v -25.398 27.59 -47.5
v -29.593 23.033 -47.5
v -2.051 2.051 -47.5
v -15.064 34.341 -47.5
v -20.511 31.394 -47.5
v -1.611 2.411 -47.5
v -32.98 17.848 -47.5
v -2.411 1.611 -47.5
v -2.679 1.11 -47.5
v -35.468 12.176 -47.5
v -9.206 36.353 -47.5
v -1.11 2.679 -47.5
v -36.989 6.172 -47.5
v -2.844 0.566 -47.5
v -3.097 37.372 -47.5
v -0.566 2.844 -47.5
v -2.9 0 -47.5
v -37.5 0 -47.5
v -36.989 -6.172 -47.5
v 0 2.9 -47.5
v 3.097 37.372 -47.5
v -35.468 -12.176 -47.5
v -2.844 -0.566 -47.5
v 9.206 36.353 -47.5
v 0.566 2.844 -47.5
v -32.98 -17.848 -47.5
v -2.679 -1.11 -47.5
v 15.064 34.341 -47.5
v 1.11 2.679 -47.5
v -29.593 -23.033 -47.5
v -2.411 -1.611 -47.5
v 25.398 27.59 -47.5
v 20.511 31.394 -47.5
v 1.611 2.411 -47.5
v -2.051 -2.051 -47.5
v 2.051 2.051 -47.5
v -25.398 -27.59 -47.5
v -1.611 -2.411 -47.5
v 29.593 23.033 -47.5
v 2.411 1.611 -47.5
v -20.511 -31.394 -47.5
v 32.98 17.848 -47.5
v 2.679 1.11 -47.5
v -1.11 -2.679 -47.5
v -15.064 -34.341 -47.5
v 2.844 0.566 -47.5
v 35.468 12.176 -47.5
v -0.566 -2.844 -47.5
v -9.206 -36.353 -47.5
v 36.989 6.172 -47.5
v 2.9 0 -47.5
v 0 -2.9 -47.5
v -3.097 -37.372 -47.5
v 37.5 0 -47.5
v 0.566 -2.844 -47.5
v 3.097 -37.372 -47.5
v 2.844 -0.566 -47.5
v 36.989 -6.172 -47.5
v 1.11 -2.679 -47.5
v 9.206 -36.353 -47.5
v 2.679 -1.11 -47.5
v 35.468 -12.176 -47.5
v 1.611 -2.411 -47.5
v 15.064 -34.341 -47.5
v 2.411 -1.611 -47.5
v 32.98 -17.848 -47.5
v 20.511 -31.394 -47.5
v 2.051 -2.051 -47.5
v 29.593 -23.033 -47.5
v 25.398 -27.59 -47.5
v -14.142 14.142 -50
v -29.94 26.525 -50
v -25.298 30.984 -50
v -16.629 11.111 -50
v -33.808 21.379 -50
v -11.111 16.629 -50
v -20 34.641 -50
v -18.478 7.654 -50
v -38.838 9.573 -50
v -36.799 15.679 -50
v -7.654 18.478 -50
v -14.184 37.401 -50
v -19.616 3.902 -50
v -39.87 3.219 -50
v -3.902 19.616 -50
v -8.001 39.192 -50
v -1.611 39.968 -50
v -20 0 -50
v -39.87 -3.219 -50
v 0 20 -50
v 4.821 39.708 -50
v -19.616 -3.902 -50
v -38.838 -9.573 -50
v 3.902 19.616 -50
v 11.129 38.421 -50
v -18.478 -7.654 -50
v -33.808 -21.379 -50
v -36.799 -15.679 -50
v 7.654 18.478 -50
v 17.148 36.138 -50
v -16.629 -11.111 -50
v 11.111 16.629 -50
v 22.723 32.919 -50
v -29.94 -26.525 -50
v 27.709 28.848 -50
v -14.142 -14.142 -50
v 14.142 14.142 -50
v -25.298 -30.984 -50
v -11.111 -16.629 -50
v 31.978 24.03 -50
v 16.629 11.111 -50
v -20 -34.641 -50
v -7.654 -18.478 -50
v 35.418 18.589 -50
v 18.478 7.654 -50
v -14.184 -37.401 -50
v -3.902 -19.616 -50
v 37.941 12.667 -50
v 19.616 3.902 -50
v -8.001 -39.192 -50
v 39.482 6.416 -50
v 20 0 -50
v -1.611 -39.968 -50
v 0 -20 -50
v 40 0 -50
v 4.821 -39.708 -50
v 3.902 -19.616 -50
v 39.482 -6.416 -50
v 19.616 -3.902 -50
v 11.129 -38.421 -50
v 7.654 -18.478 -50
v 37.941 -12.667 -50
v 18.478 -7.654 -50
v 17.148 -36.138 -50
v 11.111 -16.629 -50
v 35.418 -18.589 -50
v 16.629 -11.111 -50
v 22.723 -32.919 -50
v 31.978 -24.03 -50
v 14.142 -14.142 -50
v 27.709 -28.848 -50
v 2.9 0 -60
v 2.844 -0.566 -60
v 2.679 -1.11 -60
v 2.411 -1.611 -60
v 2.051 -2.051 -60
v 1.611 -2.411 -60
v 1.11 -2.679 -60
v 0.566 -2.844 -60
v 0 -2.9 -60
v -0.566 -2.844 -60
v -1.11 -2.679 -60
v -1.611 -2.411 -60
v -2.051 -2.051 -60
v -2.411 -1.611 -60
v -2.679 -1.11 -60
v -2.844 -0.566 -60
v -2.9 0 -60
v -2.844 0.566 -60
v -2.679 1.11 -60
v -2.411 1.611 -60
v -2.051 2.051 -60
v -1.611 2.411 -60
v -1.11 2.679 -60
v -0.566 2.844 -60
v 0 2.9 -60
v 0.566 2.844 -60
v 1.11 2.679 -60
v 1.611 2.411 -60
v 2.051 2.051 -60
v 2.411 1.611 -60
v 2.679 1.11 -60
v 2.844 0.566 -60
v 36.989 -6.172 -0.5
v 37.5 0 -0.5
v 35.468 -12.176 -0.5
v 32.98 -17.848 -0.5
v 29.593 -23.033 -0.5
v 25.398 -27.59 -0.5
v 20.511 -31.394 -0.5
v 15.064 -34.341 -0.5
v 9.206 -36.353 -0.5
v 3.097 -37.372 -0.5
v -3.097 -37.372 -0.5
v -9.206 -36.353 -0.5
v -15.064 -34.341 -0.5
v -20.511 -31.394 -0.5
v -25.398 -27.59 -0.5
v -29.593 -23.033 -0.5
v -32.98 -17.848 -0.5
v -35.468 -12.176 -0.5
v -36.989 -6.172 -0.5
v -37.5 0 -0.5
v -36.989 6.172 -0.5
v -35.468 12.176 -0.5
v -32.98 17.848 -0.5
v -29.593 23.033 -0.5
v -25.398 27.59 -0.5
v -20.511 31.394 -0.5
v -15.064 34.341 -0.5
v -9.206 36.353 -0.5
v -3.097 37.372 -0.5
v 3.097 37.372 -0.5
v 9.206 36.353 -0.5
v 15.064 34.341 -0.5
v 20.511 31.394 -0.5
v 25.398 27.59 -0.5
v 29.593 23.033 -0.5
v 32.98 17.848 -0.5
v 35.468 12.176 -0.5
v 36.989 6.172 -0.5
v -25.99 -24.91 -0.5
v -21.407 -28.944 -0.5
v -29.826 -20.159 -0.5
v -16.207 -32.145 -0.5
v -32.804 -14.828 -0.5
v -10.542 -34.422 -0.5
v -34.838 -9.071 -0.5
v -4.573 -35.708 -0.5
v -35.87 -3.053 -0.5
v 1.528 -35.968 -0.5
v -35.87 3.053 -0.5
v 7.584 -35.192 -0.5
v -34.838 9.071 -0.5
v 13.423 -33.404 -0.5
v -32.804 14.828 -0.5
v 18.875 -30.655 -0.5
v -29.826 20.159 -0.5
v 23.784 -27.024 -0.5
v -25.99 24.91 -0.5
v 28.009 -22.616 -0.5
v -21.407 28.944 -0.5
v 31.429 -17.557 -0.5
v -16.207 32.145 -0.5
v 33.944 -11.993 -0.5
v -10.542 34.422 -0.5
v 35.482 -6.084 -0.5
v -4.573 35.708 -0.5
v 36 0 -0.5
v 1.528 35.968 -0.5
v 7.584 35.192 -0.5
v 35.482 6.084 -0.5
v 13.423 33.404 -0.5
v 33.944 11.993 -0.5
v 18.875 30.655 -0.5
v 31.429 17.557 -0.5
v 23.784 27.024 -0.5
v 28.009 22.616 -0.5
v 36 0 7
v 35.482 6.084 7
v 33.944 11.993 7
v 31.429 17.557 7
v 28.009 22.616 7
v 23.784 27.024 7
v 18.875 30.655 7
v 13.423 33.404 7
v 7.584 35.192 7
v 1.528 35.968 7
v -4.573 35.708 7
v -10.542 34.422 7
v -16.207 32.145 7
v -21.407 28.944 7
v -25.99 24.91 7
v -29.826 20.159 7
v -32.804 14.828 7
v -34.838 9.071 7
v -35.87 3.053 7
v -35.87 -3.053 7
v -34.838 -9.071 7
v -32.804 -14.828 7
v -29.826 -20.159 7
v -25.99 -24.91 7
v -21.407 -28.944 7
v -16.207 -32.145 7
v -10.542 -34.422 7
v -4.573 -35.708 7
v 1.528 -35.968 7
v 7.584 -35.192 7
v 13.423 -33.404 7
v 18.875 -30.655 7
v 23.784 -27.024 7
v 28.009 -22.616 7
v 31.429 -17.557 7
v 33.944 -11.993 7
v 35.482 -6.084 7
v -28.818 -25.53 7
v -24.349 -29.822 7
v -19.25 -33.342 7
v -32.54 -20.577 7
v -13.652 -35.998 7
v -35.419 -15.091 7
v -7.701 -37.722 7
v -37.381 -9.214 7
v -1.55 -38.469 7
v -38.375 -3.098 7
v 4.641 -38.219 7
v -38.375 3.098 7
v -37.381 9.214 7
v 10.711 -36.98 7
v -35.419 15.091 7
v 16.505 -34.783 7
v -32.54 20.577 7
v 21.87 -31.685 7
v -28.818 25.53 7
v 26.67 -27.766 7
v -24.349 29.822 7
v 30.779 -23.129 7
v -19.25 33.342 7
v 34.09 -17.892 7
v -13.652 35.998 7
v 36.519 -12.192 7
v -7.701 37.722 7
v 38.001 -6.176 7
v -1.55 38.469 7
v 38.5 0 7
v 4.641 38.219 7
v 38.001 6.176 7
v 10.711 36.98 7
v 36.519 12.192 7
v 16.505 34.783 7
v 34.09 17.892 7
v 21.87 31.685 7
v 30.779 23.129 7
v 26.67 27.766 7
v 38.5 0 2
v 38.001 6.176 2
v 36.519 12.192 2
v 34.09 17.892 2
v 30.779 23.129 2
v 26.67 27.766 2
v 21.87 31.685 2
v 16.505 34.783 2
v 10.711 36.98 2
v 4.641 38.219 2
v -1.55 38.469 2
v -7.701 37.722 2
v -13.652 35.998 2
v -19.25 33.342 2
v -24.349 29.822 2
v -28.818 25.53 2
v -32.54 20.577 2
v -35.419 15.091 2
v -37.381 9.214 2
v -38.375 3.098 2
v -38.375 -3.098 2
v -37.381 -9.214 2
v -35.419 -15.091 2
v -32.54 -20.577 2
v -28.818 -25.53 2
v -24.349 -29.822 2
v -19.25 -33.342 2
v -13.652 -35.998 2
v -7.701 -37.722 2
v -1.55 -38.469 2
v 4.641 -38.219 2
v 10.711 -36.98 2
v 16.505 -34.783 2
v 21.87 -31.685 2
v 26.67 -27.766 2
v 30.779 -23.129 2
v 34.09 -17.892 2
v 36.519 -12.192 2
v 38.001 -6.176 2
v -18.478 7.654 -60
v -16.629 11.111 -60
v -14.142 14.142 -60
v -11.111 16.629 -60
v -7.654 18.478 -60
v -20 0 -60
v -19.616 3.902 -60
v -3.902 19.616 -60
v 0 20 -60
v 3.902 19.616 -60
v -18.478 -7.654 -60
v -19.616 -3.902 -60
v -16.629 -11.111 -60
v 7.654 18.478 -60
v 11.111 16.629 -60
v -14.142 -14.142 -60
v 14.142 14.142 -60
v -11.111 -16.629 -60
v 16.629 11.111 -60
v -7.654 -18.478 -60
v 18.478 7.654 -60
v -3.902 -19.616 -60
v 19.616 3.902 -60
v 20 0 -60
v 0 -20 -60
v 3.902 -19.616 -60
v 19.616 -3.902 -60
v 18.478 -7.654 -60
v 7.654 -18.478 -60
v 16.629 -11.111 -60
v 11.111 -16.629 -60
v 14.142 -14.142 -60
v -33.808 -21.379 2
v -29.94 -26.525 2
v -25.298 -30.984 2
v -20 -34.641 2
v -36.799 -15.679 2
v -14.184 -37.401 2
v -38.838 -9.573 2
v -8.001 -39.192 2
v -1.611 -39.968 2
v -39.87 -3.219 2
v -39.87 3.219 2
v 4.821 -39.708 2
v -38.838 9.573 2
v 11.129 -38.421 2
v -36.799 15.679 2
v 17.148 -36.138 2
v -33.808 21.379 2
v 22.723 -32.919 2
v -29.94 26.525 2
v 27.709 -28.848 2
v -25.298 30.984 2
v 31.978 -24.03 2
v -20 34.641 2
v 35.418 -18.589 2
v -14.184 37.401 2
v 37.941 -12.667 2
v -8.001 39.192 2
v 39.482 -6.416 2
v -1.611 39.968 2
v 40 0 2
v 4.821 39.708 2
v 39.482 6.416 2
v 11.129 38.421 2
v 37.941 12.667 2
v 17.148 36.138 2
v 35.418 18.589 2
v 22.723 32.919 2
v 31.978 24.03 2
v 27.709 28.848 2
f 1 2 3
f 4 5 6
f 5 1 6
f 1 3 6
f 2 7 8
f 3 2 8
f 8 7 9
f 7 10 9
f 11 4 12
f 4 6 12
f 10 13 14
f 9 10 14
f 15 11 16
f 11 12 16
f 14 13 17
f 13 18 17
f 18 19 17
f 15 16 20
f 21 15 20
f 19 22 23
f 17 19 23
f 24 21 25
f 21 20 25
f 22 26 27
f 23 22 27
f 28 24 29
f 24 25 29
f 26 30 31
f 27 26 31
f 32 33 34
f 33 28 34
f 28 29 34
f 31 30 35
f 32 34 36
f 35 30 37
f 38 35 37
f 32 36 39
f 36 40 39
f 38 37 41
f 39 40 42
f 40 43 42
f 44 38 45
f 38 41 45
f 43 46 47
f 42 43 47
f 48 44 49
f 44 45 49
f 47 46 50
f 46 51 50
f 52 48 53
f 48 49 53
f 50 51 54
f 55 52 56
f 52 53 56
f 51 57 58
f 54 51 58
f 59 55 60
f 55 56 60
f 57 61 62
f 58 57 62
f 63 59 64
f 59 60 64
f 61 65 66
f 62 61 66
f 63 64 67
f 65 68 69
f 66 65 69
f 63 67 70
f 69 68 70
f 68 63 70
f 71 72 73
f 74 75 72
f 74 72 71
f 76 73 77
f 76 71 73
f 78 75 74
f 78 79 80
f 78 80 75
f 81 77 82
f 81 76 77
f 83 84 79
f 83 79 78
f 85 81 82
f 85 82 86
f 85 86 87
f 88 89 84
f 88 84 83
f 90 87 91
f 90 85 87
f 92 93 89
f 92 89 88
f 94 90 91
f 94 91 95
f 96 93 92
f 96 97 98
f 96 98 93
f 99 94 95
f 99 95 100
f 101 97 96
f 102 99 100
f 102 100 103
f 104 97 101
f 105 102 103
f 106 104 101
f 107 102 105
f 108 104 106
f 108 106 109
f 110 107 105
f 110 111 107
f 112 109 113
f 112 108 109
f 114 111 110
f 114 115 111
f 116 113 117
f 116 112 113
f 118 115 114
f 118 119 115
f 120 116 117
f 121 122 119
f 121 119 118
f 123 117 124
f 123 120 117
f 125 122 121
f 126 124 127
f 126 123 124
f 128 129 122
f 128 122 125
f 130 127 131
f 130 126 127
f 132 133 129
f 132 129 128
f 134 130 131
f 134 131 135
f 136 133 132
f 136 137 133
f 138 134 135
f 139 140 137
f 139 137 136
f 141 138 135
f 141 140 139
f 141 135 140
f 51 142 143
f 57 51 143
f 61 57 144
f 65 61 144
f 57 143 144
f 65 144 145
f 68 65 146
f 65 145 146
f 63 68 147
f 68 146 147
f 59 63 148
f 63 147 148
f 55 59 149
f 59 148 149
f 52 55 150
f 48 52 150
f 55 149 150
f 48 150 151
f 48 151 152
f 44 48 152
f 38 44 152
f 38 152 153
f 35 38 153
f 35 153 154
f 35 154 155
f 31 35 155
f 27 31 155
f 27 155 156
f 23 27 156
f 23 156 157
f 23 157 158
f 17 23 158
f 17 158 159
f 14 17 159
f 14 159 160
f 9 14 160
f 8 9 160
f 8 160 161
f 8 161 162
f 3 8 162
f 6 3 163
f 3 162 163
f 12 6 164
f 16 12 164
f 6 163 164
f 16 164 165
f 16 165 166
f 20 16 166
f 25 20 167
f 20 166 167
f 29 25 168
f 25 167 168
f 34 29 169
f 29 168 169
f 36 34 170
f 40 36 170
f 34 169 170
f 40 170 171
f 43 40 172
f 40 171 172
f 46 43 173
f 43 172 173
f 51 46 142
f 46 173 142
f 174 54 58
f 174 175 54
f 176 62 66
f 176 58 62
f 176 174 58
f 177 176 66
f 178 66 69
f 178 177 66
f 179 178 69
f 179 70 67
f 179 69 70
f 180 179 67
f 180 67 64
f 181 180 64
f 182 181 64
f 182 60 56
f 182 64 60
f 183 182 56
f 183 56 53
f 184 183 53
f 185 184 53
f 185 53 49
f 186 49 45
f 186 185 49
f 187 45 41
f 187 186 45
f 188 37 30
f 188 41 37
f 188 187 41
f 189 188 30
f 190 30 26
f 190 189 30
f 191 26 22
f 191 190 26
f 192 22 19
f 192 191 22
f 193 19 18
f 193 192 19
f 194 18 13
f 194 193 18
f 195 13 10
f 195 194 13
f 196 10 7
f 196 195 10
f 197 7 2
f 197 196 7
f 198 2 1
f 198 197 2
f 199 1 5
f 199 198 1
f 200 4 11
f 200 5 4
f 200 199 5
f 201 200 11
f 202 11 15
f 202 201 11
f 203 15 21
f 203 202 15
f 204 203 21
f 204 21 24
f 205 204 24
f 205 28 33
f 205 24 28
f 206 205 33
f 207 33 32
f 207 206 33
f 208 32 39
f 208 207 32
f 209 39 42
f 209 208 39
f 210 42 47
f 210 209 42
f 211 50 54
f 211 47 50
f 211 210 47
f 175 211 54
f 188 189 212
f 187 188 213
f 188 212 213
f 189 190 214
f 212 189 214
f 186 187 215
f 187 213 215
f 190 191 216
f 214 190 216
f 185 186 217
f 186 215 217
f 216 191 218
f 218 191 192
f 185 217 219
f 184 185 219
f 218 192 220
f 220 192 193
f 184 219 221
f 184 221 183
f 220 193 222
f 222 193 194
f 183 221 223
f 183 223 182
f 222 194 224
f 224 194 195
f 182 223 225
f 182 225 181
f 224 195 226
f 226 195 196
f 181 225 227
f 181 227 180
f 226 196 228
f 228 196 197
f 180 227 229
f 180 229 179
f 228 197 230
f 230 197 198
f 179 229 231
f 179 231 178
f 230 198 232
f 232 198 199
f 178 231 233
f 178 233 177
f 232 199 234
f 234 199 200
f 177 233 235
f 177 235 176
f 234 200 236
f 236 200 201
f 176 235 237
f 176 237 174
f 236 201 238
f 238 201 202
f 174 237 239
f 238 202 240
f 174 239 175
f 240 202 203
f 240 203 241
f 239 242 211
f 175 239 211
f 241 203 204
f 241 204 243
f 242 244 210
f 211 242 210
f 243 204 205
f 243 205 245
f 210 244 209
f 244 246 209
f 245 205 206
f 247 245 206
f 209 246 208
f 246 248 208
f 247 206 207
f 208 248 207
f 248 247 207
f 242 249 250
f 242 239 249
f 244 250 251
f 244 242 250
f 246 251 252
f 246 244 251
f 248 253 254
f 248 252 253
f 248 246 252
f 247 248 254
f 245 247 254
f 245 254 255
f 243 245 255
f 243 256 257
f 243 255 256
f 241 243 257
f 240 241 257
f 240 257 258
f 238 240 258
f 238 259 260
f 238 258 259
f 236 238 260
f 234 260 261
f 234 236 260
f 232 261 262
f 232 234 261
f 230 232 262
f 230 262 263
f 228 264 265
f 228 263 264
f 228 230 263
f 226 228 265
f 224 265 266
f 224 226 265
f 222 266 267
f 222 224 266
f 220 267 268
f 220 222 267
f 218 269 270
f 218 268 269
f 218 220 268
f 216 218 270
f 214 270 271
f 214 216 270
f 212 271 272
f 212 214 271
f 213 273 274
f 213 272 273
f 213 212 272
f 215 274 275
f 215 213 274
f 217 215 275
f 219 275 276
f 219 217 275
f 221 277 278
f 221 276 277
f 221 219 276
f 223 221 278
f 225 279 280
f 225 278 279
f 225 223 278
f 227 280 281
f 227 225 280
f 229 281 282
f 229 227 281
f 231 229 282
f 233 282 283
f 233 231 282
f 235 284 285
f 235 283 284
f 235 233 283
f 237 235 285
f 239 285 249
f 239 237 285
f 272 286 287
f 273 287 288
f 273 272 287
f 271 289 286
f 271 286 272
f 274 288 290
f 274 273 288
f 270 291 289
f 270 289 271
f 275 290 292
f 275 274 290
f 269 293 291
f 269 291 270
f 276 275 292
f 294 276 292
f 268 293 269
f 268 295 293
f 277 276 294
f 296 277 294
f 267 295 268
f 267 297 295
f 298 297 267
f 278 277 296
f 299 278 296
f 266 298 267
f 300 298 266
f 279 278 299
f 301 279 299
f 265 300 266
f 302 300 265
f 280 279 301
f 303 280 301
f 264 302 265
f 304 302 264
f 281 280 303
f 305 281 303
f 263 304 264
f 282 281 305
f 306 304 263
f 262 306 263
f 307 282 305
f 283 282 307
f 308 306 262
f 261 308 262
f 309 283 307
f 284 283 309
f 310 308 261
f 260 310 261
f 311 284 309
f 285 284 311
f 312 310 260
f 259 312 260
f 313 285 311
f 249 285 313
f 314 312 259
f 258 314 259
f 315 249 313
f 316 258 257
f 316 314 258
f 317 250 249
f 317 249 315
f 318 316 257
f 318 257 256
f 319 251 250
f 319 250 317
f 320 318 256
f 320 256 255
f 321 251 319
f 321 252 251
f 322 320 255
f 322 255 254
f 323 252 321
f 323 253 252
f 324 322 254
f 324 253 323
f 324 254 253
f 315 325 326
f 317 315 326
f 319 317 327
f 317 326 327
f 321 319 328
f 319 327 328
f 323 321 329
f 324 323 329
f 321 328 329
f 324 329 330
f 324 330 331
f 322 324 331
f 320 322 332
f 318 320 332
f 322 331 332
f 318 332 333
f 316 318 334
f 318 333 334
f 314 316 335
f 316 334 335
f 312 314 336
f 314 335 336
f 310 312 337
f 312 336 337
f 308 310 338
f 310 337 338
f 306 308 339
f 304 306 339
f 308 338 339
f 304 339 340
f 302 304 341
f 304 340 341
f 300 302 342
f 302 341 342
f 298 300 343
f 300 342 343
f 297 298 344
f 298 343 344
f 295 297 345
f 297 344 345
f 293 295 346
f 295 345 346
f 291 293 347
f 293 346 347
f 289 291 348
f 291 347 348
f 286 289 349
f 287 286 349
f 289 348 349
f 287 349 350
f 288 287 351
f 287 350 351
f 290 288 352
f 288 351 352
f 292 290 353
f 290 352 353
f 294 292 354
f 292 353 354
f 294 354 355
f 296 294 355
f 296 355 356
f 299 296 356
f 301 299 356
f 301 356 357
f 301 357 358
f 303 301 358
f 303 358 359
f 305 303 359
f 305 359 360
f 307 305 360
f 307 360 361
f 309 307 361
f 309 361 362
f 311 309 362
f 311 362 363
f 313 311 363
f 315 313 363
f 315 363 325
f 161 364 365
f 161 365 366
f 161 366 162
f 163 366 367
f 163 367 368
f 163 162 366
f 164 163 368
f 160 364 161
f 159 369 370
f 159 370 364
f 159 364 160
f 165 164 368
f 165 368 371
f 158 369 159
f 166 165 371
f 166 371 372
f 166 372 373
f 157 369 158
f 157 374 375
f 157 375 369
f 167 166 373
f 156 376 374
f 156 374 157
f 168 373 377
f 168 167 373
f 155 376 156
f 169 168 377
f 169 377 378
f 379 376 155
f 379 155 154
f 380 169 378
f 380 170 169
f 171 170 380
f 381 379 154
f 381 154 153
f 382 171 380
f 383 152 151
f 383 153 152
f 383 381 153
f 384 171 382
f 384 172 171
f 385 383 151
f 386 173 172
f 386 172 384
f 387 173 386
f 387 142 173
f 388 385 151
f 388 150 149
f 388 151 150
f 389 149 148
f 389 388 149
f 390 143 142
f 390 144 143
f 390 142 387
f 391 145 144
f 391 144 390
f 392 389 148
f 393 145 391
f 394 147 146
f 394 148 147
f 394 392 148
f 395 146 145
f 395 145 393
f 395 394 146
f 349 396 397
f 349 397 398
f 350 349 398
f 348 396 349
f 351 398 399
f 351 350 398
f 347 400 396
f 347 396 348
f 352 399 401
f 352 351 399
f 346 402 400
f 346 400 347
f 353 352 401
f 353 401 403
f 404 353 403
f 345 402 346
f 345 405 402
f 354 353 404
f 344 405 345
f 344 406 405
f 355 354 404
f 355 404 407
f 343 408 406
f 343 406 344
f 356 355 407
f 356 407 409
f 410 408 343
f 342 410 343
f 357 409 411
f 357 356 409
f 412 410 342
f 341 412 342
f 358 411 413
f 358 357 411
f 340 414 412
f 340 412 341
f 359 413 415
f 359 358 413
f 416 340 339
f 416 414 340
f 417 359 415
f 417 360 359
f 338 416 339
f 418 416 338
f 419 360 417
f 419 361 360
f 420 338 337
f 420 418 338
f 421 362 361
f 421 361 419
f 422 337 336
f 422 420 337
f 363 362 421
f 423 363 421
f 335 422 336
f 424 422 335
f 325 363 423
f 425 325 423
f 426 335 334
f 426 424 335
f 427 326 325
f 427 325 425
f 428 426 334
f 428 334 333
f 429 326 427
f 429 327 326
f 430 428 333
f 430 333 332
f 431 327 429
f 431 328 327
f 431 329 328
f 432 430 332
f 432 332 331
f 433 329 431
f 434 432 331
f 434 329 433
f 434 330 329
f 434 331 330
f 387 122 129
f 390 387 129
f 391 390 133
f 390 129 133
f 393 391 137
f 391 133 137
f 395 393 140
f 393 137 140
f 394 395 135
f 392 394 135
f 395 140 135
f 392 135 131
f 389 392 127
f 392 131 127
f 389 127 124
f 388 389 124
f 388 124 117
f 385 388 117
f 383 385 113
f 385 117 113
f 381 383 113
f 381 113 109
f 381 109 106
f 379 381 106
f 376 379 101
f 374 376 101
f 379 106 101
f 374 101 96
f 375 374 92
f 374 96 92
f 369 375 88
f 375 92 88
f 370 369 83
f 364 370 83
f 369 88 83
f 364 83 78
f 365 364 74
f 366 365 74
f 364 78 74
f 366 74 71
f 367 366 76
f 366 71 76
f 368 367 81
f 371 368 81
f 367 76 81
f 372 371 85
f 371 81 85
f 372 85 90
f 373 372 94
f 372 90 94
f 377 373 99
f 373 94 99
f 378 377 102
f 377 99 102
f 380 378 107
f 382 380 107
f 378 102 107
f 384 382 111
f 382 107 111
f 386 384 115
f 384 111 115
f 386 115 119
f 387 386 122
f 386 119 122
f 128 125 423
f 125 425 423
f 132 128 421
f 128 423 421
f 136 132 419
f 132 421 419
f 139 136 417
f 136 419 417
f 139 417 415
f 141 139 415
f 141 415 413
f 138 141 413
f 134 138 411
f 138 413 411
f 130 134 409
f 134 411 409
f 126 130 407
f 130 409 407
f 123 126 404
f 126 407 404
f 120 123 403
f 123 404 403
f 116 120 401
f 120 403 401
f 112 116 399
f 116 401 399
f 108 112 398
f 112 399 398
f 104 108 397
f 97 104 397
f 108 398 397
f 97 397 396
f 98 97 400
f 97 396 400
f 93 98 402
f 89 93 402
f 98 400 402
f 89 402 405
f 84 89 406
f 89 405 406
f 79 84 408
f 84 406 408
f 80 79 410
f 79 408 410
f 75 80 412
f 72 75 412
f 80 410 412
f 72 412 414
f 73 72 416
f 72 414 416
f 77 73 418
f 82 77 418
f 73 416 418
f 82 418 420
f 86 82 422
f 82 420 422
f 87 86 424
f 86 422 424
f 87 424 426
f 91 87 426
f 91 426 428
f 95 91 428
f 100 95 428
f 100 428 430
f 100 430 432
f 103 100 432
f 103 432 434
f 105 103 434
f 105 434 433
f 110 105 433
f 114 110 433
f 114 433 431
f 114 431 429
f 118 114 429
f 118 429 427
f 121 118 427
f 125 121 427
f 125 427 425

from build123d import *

# Parameters (mm, degrees)
F0_R      = 40
F1_DEPTH  = 2
F2_R      = 38.5
F3_DEPTH  = 5
F4_R      = 40
F5_DEPTH  = 50
F7_T      = -2.5
F6_R      = 20
F8_DEPTH  = 10
F9_R      = 2.9
F10_DEPTH = 67.001


with BuildPart() as f1:
    # F0 (on Top) → F1 (new body)
    with BuildSketch(Plane.XY):
        Circle(F0_R)
    extrude(amount=F1_DEPTH)

    # F2 (on face) → F3 (join)
    with BuildSketch(Plane.XY.offset(2)):
        Circle(F2_R)
    extrude(amount=F3_DEPTH)

    # F4 (on face) → F5 (join)
    with BuildSketch(Plane(origin=(0, 0, 0), x_dir=(1, 0, 0), z_dir=(0, 0, -1))):
        Circle(F4_R)
    extrude(amount=F5_DEPTH)

    # F7
    f7_openings = [f1.faces().sort_by_distance(p)[0] for p in [
        (0, 0, 7),
    ]]
    offset(amount=F7_T, openings=f7_openings, kind=Kind.INTERSECTION)

    # F6 (on face) → F8 (join)
    with BuildSketch(Plane(origin=(0, 0, -50), x_dir=(1, 0, 0), z_dir=(0, 0, -1))):
        Circle(F6_R)
    extrude(amount=F8_DEPTH)

    # F9 (on face) → F10 (cut, through all)
    with BuildSketch(Plane(origin=(0, 0, -60), x_dir=(1, 0, 0), z_dir=(0, 0, -1))):
        Circle(F9_R)
    extrude(amount=-F10_DEPTH, mode=Mode.SUBTRACT)


solid = f1.part
